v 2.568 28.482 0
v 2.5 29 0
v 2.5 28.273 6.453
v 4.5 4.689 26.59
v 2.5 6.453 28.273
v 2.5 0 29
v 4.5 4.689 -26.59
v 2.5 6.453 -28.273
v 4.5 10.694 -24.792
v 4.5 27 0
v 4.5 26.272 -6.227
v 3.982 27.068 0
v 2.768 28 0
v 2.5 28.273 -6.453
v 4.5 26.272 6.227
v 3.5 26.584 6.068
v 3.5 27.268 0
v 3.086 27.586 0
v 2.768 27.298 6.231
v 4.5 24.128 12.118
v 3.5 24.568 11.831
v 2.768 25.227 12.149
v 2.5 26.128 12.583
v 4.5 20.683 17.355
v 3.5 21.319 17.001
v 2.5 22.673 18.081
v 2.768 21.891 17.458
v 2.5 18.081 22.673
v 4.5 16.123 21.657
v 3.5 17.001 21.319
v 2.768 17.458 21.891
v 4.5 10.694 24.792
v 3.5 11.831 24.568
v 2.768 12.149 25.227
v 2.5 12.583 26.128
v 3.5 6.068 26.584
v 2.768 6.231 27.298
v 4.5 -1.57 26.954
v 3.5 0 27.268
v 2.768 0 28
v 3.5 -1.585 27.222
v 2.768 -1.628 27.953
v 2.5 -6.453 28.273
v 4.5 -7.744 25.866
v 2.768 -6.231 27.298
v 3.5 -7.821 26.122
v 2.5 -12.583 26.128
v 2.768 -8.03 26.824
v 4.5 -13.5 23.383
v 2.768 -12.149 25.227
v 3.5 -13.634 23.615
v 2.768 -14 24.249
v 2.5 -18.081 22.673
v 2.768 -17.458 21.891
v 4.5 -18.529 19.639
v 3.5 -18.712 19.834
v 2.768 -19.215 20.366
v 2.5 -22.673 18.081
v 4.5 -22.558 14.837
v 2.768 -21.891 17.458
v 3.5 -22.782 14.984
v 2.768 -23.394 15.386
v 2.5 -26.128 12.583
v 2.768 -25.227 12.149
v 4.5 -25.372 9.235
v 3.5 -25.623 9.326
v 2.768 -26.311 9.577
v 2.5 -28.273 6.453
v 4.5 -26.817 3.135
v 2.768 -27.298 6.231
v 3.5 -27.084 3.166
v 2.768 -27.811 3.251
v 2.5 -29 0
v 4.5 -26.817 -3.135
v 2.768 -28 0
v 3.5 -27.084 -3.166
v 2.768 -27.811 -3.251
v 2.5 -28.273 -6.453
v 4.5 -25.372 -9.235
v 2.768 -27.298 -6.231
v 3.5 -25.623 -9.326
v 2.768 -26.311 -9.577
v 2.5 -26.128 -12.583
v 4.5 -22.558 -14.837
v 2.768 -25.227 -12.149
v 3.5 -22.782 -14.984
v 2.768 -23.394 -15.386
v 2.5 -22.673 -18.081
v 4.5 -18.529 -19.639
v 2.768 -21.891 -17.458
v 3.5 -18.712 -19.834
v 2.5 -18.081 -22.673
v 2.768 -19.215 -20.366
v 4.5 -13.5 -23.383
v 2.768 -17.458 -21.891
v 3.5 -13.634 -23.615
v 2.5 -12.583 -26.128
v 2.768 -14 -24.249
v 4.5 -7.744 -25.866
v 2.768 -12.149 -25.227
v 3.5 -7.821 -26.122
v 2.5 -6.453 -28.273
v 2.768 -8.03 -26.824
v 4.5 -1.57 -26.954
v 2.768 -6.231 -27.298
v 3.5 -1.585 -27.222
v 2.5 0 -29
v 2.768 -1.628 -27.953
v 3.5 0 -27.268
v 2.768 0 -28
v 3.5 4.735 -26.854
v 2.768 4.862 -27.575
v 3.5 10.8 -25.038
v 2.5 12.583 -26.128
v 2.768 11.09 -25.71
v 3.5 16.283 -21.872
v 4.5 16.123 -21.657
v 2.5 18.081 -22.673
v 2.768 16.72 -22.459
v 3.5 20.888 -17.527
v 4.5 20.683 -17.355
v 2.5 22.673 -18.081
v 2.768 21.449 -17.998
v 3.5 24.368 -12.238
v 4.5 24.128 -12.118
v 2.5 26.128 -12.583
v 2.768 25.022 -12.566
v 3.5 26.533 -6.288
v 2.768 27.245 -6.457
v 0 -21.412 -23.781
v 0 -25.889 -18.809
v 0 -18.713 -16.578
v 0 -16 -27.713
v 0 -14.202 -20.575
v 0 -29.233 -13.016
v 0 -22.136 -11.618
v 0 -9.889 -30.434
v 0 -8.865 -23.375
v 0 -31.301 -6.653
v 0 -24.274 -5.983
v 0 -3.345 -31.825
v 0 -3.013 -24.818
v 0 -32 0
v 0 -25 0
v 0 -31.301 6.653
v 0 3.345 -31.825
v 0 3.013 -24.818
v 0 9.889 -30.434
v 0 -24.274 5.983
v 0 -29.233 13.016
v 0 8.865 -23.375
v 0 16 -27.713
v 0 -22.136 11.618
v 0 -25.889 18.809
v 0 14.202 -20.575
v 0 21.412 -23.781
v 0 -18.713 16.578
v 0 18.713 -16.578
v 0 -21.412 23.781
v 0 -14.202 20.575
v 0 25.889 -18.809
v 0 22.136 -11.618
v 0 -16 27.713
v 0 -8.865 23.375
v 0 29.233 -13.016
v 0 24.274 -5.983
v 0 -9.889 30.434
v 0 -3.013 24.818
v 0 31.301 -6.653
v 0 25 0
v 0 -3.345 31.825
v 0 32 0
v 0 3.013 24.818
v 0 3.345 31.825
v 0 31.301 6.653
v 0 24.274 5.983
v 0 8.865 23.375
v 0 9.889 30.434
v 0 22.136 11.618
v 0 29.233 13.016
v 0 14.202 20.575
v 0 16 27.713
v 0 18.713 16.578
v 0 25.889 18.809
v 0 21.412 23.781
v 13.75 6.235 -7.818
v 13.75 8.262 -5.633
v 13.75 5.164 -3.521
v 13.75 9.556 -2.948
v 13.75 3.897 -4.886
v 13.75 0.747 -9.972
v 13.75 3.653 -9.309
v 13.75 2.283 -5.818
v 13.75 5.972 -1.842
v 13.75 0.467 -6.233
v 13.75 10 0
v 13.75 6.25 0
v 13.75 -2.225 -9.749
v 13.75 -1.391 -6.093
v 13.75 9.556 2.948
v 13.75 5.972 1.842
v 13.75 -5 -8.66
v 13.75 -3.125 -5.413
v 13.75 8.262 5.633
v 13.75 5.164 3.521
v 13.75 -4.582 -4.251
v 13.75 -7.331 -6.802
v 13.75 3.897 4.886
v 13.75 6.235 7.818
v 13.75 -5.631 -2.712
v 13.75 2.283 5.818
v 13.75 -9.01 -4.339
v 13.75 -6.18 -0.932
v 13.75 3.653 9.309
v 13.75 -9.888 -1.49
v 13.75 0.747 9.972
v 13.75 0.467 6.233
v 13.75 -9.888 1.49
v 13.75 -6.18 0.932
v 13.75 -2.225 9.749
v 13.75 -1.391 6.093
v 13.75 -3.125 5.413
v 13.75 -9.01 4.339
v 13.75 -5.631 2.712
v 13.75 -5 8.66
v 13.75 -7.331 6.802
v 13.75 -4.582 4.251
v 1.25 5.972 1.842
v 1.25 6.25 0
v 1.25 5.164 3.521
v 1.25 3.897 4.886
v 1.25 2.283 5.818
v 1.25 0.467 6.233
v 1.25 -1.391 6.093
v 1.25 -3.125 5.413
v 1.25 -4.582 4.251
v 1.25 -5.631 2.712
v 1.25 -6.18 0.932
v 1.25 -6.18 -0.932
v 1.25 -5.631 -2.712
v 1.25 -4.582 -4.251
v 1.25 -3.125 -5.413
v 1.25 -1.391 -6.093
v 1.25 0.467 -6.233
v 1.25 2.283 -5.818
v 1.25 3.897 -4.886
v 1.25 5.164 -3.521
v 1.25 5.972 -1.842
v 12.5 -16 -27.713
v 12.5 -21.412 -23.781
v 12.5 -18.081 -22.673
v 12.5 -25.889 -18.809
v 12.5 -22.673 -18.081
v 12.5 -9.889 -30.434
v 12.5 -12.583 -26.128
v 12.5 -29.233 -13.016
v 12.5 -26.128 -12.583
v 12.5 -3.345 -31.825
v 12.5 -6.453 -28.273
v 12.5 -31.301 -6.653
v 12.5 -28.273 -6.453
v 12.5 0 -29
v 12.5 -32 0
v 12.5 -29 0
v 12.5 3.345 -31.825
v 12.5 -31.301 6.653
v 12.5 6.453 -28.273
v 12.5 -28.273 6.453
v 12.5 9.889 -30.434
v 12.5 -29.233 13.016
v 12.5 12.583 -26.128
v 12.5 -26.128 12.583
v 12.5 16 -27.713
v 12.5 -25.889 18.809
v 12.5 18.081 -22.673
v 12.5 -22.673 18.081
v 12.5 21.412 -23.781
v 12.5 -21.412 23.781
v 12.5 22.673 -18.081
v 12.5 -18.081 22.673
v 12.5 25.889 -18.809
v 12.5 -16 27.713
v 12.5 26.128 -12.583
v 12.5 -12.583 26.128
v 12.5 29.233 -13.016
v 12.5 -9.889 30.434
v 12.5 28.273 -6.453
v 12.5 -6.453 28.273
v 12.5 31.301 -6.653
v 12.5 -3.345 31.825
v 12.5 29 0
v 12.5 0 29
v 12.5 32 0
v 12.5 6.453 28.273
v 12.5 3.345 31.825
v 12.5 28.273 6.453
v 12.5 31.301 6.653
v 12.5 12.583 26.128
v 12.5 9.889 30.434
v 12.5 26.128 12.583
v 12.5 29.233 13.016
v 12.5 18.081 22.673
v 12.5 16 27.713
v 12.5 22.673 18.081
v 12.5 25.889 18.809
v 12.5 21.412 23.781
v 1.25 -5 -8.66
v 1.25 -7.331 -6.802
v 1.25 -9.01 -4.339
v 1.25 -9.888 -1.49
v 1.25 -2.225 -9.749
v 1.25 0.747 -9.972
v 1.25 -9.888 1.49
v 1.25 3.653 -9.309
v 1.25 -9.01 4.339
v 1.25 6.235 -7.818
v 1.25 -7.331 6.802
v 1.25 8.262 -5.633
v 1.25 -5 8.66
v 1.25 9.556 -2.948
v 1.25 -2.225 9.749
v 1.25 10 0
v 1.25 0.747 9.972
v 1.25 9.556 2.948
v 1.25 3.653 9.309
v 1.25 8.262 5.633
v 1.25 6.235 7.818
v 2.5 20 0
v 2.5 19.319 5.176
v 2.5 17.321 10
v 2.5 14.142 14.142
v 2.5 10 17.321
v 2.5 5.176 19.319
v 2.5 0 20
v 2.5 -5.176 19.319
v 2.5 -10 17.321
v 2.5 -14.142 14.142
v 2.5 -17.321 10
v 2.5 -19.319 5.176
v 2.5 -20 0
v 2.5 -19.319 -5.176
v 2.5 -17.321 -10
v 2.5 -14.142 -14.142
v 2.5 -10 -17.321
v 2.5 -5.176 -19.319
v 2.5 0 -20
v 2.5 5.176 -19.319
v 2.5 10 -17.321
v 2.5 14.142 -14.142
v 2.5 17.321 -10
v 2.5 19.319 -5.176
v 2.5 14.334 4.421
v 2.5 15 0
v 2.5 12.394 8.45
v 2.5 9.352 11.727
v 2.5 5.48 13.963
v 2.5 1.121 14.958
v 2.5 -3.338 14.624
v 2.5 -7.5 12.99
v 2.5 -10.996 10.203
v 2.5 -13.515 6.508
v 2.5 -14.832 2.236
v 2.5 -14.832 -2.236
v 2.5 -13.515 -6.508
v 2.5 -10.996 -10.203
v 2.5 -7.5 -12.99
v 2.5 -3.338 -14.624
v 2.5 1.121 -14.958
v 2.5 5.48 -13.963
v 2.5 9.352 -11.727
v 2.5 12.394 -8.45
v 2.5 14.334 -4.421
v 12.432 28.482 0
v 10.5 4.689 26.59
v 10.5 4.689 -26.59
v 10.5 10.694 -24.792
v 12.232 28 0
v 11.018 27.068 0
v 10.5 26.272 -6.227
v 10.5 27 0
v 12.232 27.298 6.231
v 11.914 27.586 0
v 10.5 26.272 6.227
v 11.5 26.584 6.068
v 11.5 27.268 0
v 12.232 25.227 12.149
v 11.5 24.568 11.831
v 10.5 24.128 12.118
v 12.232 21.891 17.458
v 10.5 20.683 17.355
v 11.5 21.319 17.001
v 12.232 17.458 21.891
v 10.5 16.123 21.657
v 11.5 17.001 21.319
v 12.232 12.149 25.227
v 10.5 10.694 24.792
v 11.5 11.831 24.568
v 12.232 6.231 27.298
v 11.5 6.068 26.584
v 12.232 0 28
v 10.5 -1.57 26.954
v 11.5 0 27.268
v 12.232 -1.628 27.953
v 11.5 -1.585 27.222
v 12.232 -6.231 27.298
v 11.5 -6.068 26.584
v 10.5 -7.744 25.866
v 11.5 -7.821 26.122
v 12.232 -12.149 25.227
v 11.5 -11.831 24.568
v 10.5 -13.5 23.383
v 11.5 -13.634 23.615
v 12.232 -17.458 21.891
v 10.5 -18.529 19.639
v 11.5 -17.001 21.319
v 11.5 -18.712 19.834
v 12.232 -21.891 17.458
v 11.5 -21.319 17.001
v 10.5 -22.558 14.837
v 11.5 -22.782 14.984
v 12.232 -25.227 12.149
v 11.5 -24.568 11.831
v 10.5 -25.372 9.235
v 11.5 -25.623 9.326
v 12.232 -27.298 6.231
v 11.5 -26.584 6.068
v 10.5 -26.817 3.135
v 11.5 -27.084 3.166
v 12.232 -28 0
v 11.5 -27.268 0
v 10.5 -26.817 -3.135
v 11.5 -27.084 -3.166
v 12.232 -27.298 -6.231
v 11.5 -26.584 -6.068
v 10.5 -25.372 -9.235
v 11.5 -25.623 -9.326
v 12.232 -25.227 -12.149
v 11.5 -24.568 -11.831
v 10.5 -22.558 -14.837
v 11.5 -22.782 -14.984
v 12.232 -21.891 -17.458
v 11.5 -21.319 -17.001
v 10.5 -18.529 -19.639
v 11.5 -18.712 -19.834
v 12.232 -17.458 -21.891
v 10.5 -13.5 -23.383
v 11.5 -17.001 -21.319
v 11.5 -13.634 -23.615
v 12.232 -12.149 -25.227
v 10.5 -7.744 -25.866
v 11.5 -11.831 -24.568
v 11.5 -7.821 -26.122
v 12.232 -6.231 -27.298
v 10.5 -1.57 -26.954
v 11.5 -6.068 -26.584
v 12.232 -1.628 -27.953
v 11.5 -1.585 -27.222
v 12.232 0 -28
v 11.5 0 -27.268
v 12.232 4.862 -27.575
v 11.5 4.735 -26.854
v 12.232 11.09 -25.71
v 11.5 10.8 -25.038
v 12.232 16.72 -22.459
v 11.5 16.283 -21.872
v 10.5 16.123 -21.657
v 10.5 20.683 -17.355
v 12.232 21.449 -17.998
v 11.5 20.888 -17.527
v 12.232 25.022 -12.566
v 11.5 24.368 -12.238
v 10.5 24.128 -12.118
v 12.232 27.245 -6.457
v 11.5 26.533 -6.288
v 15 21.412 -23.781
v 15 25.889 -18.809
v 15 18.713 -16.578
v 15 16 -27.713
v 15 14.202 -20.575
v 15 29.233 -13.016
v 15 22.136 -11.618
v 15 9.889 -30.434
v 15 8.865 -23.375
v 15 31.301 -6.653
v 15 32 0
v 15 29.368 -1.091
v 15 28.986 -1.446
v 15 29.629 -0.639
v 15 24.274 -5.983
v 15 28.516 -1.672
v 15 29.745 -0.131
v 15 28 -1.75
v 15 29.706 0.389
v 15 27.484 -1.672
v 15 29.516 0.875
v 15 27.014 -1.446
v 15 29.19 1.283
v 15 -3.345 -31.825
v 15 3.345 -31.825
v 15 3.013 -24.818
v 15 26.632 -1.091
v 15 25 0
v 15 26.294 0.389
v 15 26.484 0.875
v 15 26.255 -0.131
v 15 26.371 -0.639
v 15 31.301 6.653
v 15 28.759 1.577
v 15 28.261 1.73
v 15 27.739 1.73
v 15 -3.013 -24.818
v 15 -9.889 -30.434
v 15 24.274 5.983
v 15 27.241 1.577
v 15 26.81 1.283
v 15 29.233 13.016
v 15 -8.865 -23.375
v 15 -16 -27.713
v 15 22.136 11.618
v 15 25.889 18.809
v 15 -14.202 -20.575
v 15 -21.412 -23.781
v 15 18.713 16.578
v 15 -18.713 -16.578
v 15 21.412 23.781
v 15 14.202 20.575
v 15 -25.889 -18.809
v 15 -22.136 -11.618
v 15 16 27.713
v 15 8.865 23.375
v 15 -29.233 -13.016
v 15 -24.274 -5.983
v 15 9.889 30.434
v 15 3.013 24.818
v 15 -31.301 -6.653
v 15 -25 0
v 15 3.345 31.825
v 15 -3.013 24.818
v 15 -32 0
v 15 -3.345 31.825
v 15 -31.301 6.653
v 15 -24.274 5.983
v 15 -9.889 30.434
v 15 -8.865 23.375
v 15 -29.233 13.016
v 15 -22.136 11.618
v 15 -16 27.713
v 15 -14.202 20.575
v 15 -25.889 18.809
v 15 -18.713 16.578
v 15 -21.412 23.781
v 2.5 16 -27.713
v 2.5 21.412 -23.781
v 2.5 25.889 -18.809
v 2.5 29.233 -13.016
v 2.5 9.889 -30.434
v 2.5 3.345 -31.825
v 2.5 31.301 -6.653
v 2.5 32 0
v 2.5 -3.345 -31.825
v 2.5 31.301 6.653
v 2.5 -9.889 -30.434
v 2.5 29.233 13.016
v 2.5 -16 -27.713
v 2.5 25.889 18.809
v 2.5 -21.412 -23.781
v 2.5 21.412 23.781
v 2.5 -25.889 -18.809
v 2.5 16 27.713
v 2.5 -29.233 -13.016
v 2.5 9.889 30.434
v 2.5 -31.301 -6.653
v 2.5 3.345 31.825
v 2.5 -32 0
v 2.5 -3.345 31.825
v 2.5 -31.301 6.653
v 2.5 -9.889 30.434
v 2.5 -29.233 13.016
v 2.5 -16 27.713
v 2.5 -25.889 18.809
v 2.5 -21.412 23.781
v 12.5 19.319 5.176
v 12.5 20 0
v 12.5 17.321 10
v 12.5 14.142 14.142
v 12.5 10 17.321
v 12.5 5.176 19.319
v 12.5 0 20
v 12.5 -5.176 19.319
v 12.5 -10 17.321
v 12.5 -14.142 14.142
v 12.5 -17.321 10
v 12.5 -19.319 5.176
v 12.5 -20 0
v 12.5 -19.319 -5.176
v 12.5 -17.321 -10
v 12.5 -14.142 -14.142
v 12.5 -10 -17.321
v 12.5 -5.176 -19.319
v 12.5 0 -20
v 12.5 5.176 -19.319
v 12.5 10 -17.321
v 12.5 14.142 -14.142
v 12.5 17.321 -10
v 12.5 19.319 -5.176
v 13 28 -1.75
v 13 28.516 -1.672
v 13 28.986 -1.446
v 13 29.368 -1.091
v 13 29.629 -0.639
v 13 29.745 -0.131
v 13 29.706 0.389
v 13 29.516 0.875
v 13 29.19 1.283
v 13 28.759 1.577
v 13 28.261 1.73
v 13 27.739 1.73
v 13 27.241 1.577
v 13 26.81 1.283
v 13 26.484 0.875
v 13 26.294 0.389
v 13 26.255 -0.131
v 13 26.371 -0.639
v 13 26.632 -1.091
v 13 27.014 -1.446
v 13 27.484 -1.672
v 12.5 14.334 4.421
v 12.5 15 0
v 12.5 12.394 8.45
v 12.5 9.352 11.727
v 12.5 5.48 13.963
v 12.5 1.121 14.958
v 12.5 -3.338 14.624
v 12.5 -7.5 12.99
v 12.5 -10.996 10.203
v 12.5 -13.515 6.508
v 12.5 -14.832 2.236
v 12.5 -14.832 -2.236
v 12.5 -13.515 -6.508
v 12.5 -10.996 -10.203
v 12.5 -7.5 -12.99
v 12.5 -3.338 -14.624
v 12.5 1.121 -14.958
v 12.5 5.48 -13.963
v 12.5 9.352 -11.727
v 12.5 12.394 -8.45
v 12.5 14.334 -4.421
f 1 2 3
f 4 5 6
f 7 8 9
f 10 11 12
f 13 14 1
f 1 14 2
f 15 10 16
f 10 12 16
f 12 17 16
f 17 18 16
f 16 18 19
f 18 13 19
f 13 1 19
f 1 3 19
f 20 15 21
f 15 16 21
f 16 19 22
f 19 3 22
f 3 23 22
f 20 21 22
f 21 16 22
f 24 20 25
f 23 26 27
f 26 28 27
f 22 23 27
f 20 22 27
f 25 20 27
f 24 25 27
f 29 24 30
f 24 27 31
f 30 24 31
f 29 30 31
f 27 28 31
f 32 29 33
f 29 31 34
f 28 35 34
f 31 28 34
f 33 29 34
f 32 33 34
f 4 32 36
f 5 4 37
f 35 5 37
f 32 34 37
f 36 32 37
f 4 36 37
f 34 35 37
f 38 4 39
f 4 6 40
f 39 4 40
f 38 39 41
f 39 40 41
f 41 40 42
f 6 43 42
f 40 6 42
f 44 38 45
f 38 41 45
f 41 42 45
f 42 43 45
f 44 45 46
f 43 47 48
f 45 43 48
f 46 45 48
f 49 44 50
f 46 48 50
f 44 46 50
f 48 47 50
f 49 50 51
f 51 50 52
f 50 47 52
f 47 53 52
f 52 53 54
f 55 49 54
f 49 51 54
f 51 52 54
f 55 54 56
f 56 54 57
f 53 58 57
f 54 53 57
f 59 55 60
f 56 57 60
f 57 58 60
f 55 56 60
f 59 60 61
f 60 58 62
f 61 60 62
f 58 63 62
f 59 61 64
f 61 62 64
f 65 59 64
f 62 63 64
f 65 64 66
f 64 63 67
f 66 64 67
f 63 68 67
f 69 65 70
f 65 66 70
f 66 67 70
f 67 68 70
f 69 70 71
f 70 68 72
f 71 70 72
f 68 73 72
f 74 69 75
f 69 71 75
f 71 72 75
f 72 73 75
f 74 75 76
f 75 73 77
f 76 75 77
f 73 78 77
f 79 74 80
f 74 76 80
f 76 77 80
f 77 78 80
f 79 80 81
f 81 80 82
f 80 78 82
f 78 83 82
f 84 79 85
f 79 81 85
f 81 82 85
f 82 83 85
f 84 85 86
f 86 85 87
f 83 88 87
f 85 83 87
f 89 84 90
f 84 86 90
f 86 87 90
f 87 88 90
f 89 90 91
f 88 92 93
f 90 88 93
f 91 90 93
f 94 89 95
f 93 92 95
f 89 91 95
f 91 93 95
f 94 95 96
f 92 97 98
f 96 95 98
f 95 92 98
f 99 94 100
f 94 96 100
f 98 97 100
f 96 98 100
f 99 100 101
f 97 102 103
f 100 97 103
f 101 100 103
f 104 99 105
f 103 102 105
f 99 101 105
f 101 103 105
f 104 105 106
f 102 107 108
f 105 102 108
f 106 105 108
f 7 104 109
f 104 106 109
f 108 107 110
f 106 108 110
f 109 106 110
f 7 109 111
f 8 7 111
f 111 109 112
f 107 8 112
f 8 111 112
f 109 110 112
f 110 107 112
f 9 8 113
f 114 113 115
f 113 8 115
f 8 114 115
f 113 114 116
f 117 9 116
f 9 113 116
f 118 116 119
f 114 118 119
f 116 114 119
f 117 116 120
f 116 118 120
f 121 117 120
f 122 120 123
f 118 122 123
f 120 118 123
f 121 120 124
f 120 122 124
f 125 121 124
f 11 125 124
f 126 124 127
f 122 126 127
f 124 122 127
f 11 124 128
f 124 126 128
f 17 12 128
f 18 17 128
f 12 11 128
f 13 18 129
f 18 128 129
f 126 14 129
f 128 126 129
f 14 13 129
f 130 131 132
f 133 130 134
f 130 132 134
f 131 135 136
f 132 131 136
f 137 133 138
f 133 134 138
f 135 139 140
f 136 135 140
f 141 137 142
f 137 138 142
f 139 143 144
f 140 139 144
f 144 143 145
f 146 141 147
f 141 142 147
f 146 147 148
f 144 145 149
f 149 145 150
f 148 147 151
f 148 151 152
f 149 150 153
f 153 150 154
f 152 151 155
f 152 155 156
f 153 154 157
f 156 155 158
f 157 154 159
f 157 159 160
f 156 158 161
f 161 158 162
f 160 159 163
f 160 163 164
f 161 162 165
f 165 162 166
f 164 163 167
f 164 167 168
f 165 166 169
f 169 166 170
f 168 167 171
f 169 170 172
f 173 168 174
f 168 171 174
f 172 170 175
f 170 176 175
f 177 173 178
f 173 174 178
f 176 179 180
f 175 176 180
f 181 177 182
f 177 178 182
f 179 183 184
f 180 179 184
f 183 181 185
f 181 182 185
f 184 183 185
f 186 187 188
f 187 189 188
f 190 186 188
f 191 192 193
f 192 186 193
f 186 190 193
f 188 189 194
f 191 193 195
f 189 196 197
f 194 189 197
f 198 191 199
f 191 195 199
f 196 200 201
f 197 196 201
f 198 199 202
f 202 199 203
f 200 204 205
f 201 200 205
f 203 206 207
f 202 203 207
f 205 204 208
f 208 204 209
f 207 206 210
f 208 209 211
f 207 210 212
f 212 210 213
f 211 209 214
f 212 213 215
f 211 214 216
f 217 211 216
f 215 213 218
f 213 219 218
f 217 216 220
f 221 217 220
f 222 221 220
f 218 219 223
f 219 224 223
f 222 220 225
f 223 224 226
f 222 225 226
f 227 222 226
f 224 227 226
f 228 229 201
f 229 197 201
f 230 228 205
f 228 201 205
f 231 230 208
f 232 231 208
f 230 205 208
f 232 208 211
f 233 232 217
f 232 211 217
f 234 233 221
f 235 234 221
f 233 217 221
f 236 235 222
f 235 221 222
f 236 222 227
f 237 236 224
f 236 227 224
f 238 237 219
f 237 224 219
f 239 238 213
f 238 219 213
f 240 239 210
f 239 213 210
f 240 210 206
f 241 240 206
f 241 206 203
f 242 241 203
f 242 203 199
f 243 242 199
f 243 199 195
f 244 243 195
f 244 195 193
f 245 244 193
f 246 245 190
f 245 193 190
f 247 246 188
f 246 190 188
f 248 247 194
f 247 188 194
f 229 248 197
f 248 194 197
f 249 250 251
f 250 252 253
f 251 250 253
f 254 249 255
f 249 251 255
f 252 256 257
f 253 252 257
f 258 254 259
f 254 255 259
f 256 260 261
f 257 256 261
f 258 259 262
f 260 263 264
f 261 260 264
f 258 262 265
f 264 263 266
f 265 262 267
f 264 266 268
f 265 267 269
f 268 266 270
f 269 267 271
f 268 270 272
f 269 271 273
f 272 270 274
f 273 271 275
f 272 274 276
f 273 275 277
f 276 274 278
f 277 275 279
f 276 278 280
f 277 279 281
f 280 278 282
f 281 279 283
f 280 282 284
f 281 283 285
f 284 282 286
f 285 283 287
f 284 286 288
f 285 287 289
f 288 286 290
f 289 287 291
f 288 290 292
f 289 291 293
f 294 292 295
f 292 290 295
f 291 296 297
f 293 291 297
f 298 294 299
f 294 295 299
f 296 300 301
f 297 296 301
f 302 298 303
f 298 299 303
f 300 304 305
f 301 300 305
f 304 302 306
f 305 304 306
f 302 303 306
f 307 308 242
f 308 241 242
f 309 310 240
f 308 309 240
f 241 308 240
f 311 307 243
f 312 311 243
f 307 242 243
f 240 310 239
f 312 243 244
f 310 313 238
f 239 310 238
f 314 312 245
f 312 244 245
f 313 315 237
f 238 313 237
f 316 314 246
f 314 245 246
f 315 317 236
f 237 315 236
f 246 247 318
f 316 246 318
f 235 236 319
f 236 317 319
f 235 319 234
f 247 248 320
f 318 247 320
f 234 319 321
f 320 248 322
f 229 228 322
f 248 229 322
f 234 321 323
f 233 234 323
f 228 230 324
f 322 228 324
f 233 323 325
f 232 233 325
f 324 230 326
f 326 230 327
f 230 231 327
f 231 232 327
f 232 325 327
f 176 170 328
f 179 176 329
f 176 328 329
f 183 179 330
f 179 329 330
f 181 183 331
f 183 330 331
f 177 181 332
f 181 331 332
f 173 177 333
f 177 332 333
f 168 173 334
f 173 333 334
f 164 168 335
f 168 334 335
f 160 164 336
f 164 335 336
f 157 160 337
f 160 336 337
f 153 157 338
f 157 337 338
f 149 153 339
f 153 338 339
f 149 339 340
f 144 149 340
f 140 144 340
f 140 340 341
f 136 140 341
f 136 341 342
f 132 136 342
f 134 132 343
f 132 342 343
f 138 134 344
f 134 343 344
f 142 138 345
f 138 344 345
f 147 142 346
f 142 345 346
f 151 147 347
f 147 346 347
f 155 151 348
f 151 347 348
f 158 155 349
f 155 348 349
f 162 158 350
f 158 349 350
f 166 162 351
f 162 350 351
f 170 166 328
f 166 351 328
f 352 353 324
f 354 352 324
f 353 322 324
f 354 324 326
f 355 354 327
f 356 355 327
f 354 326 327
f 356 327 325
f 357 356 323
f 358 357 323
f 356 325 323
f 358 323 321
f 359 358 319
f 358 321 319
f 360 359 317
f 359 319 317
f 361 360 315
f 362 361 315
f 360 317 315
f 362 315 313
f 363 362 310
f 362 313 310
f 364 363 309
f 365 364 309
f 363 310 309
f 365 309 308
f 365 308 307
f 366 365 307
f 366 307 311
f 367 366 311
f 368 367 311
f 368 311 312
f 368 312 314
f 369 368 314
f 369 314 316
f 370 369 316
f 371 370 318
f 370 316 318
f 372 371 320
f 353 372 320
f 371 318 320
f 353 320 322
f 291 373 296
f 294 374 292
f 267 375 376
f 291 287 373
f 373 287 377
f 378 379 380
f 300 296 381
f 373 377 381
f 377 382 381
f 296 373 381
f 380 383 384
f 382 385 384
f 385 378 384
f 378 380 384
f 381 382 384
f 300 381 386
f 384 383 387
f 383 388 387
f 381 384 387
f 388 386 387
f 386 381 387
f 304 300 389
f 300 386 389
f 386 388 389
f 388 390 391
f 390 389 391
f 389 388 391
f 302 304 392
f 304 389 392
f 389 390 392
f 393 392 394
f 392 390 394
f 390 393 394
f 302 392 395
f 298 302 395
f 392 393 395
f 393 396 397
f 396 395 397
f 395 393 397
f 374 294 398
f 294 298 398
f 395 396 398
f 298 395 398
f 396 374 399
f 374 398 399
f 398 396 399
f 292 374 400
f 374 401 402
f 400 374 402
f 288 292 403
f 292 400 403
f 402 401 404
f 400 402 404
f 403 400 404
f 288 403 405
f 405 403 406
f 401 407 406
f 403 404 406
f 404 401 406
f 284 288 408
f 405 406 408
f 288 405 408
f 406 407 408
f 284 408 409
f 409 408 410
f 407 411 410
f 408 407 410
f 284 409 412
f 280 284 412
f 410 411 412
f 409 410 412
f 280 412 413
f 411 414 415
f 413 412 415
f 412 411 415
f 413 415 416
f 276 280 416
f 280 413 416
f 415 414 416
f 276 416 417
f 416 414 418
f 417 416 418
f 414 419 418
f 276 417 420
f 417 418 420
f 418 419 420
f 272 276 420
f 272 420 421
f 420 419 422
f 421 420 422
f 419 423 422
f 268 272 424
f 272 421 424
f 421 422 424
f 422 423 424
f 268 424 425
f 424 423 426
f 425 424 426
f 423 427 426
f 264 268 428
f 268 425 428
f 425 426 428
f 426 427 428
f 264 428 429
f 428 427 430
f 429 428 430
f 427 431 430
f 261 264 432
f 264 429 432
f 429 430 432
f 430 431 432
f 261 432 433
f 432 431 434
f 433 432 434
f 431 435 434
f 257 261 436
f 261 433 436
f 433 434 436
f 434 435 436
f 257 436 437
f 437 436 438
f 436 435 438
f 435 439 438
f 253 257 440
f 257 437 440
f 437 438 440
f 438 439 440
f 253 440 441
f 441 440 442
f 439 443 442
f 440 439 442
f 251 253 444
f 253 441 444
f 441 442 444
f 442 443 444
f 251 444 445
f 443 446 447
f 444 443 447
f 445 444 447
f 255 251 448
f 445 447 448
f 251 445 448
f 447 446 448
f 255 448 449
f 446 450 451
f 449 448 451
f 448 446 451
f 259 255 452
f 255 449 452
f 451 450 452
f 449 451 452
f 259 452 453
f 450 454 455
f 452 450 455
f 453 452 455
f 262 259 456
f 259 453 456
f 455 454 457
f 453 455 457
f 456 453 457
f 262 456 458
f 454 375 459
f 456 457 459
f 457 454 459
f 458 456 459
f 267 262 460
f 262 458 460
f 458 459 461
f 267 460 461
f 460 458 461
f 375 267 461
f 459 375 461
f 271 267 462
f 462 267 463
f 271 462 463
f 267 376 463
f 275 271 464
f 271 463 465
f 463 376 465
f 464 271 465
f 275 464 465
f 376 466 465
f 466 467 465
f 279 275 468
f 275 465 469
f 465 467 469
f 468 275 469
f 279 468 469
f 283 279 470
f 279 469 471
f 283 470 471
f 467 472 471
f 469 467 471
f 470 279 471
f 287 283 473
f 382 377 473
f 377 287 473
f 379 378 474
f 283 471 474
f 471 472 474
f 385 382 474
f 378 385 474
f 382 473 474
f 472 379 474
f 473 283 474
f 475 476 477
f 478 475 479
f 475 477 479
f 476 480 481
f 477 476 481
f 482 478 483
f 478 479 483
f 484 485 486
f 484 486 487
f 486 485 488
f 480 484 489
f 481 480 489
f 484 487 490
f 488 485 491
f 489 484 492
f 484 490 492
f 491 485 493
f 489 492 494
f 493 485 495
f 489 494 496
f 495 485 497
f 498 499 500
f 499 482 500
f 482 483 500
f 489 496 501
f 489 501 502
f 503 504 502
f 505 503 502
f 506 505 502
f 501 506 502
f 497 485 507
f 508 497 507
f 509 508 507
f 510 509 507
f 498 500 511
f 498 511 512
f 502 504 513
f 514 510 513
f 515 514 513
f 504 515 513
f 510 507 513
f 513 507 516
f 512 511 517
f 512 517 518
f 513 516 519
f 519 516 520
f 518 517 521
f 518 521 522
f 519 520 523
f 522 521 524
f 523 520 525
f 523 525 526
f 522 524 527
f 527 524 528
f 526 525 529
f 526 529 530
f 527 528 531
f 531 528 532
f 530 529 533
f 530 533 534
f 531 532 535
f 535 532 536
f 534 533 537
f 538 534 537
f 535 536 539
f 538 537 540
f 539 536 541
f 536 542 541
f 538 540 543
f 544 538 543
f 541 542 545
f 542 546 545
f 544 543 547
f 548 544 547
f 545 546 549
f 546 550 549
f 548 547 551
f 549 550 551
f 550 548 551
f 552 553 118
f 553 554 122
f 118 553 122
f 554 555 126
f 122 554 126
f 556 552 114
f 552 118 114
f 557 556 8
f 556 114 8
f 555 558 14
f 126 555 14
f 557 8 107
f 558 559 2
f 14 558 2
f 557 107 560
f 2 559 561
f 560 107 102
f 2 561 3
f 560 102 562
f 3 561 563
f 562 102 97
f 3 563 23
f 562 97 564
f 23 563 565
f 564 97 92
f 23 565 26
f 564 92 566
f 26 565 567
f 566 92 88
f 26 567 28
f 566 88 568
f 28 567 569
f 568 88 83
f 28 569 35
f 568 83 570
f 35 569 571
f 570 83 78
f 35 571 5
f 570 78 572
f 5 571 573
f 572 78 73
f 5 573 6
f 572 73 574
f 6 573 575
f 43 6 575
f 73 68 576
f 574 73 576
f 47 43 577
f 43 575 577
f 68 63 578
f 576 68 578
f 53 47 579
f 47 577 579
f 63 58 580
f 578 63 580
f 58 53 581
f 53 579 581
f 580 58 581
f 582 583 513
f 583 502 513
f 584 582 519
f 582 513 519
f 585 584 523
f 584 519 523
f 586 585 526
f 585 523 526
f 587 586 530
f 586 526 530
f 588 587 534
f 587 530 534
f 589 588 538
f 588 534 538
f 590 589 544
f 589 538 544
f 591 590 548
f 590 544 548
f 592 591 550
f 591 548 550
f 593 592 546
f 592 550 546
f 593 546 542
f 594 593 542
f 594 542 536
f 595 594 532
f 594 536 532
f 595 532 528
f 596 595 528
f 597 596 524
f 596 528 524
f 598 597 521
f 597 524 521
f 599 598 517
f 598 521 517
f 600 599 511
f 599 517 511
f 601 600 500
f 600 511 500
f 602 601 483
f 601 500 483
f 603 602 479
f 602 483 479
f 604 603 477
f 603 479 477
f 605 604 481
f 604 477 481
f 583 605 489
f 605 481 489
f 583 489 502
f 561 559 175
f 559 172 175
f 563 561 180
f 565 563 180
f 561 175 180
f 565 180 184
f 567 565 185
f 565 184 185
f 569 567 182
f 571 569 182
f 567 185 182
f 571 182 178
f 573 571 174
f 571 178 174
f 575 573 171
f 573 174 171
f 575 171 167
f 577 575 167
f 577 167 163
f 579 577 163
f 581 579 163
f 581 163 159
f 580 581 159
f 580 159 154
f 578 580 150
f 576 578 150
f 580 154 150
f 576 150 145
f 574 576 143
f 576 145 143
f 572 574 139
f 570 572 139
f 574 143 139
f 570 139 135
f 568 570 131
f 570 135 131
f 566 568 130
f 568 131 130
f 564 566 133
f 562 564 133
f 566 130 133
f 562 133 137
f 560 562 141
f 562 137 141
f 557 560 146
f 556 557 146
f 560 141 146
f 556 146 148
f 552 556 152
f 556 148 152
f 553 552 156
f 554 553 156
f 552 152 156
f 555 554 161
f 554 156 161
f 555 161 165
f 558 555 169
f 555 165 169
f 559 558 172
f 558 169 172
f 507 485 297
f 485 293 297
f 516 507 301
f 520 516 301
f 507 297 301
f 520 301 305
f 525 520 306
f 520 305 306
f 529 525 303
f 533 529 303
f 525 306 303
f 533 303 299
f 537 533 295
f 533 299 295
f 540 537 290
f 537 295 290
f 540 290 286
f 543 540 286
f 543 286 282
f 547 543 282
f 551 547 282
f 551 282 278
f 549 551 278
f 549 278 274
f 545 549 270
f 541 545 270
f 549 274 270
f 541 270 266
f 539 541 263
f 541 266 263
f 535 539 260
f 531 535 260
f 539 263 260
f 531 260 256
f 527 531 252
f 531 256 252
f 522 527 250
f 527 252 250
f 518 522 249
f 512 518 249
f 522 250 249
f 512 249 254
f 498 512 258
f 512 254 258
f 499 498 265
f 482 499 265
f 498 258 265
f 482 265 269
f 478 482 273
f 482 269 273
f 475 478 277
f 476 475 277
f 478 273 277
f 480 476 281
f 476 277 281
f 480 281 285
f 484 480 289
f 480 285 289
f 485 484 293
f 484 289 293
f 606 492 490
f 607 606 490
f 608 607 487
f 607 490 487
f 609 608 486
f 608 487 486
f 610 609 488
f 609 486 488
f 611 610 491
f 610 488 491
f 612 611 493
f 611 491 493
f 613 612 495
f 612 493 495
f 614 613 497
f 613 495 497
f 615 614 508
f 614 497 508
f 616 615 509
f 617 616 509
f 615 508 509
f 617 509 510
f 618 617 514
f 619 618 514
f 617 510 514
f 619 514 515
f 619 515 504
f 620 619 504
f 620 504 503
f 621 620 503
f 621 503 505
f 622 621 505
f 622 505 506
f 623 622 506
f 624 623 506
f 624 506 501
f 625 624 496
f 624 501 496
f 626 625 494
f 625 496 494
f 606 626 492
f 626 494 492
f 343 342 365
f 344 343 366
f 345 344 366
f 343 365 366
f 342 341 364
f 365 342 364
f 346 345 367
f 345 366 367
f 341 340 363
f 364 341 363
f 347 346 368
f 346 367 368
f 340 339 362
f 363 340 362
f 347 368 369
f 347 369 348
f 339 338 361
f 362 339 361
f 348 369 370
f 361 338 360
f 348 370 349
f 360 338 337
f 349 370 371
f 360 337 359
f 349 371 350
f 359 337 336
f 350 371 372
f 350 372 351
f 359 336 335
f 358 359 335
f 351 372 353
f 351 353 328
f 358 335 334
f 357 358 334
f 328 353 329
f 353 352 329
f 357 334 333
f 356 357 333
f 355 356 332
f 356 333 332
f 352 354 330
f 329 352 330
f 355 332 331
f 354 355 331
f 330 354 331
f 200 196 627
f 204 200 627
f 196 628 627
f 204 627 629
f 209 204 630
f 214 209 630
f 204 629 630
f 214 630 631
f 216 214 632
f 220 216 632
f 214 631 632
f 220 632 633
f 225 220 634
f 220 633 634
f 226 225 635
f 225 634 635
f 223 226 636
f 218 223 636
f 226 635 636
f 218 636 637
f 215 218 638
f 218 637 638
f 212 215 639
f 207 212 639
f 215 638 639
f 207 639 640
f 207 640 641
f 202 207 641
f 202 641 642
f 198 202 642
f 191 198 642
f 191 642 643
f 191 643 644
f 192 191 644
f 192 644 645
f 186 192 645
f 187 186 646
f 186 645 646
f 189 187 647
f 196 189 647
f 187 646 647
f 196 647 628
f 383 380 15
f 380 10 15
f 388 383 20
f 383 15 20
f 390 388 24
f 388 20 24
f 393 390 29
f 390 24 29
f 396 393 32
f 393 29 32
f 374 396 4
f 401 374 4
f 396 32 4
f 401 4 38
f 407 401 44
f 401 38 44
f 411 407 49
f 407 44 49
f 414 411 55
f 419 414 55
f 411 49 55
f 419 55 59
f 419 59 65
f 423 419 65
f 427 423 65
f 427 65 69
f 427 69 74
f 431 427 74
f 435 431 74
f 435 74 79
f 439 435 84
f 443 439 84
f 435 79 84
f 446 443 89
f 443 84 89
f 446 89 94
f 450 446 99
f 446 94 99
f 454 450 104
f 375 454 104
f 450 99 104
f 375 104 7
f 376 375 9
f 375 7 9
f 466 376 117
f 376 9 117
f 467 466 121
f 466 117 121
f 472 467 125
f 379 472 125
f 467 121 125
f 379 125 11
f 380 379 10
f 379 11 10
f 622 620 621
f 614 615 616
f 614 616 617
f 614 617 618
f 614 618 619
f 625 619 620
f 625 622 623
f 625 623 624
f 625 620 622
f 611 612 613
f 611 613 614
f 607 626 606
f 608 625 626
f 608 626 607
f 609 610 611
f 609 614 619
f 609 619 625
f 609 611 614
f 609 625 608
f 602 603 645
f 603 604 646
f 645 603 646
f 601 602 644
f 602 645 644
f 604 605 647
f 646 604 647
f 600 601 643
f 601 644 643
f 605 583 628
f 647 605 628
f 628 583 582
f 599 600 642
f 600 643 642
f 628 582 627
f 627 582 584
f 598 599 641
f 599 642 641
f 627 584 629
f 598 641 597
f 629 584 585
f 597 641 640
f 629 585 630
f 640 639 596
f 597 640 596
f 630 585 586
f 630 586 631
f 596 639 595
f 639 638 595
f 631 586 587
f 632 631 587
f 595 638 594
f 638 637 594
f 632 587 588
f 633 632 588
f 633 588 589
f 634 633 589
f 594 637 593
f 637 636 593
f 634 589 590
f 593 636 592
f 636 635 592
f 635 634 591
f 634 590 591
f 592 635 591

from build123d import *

# Parameters (mm, degrees)
ESBO_O4_R             = 1.75
CORTE_EXTRUS_O1_DEPTH = 2


with BuildPart() as part:
    # Esboço2 → Revolução1 (revolve)
    with BuildSketch(Plane.XY):
        with BuildLine():
            Line((1.25, 6.25), (13.75, 6.25))
            Line((13.75, 6.25), (13.75, 10))
            Line((13.75, 10), (12.5, 15))
            Line((12.5, 15), (12.5, 20))
            Line((12.5, 20), (15, 25))
            Line((15, 25), (15, 32))
            Line((15, 32), (12.5, 32))
            Line((12.5, 32), (12.5, 29))
            ThreePointArc((12.5, 29), (11.914213562, 27.585786438), (10.5, 27))
            Line((10.5, 27), (4.5, 27))
            ThreePointArc((4.5, 27), (3.085786438, 27.585786438), (2.5, 29))
            Line((2.5, 29), (2.5, 32))
            Line((2.5, 32), (0, 32))
            Line((0, 32), (0, 25))
            Line((0, 25), (2.5, 20))
            Line((2.5, 20), (2.5, 15))
            Line((2.5, 15), (1.25, 10))
            Line((1.25, 10), (1.25, 6.25))
        make_face()
    revolve(axis=Axis((0, 0, 0), (1, 0, 0)))

    # Esboço4 → Corte-extrusão1 (cut)
    with BuildSketch(Plane(origin=(15, 0, 0), x_dir=(0, 0, -1), z_dir=(1, 0, 0))):
        with Locations((0, 28)):
            Circle(ESBO_O4_R)
    extrude(amount=-CORTE_EXTRUS_O1_DEPTH, mode=Mode.SUBTRACT)


solid = part.part
